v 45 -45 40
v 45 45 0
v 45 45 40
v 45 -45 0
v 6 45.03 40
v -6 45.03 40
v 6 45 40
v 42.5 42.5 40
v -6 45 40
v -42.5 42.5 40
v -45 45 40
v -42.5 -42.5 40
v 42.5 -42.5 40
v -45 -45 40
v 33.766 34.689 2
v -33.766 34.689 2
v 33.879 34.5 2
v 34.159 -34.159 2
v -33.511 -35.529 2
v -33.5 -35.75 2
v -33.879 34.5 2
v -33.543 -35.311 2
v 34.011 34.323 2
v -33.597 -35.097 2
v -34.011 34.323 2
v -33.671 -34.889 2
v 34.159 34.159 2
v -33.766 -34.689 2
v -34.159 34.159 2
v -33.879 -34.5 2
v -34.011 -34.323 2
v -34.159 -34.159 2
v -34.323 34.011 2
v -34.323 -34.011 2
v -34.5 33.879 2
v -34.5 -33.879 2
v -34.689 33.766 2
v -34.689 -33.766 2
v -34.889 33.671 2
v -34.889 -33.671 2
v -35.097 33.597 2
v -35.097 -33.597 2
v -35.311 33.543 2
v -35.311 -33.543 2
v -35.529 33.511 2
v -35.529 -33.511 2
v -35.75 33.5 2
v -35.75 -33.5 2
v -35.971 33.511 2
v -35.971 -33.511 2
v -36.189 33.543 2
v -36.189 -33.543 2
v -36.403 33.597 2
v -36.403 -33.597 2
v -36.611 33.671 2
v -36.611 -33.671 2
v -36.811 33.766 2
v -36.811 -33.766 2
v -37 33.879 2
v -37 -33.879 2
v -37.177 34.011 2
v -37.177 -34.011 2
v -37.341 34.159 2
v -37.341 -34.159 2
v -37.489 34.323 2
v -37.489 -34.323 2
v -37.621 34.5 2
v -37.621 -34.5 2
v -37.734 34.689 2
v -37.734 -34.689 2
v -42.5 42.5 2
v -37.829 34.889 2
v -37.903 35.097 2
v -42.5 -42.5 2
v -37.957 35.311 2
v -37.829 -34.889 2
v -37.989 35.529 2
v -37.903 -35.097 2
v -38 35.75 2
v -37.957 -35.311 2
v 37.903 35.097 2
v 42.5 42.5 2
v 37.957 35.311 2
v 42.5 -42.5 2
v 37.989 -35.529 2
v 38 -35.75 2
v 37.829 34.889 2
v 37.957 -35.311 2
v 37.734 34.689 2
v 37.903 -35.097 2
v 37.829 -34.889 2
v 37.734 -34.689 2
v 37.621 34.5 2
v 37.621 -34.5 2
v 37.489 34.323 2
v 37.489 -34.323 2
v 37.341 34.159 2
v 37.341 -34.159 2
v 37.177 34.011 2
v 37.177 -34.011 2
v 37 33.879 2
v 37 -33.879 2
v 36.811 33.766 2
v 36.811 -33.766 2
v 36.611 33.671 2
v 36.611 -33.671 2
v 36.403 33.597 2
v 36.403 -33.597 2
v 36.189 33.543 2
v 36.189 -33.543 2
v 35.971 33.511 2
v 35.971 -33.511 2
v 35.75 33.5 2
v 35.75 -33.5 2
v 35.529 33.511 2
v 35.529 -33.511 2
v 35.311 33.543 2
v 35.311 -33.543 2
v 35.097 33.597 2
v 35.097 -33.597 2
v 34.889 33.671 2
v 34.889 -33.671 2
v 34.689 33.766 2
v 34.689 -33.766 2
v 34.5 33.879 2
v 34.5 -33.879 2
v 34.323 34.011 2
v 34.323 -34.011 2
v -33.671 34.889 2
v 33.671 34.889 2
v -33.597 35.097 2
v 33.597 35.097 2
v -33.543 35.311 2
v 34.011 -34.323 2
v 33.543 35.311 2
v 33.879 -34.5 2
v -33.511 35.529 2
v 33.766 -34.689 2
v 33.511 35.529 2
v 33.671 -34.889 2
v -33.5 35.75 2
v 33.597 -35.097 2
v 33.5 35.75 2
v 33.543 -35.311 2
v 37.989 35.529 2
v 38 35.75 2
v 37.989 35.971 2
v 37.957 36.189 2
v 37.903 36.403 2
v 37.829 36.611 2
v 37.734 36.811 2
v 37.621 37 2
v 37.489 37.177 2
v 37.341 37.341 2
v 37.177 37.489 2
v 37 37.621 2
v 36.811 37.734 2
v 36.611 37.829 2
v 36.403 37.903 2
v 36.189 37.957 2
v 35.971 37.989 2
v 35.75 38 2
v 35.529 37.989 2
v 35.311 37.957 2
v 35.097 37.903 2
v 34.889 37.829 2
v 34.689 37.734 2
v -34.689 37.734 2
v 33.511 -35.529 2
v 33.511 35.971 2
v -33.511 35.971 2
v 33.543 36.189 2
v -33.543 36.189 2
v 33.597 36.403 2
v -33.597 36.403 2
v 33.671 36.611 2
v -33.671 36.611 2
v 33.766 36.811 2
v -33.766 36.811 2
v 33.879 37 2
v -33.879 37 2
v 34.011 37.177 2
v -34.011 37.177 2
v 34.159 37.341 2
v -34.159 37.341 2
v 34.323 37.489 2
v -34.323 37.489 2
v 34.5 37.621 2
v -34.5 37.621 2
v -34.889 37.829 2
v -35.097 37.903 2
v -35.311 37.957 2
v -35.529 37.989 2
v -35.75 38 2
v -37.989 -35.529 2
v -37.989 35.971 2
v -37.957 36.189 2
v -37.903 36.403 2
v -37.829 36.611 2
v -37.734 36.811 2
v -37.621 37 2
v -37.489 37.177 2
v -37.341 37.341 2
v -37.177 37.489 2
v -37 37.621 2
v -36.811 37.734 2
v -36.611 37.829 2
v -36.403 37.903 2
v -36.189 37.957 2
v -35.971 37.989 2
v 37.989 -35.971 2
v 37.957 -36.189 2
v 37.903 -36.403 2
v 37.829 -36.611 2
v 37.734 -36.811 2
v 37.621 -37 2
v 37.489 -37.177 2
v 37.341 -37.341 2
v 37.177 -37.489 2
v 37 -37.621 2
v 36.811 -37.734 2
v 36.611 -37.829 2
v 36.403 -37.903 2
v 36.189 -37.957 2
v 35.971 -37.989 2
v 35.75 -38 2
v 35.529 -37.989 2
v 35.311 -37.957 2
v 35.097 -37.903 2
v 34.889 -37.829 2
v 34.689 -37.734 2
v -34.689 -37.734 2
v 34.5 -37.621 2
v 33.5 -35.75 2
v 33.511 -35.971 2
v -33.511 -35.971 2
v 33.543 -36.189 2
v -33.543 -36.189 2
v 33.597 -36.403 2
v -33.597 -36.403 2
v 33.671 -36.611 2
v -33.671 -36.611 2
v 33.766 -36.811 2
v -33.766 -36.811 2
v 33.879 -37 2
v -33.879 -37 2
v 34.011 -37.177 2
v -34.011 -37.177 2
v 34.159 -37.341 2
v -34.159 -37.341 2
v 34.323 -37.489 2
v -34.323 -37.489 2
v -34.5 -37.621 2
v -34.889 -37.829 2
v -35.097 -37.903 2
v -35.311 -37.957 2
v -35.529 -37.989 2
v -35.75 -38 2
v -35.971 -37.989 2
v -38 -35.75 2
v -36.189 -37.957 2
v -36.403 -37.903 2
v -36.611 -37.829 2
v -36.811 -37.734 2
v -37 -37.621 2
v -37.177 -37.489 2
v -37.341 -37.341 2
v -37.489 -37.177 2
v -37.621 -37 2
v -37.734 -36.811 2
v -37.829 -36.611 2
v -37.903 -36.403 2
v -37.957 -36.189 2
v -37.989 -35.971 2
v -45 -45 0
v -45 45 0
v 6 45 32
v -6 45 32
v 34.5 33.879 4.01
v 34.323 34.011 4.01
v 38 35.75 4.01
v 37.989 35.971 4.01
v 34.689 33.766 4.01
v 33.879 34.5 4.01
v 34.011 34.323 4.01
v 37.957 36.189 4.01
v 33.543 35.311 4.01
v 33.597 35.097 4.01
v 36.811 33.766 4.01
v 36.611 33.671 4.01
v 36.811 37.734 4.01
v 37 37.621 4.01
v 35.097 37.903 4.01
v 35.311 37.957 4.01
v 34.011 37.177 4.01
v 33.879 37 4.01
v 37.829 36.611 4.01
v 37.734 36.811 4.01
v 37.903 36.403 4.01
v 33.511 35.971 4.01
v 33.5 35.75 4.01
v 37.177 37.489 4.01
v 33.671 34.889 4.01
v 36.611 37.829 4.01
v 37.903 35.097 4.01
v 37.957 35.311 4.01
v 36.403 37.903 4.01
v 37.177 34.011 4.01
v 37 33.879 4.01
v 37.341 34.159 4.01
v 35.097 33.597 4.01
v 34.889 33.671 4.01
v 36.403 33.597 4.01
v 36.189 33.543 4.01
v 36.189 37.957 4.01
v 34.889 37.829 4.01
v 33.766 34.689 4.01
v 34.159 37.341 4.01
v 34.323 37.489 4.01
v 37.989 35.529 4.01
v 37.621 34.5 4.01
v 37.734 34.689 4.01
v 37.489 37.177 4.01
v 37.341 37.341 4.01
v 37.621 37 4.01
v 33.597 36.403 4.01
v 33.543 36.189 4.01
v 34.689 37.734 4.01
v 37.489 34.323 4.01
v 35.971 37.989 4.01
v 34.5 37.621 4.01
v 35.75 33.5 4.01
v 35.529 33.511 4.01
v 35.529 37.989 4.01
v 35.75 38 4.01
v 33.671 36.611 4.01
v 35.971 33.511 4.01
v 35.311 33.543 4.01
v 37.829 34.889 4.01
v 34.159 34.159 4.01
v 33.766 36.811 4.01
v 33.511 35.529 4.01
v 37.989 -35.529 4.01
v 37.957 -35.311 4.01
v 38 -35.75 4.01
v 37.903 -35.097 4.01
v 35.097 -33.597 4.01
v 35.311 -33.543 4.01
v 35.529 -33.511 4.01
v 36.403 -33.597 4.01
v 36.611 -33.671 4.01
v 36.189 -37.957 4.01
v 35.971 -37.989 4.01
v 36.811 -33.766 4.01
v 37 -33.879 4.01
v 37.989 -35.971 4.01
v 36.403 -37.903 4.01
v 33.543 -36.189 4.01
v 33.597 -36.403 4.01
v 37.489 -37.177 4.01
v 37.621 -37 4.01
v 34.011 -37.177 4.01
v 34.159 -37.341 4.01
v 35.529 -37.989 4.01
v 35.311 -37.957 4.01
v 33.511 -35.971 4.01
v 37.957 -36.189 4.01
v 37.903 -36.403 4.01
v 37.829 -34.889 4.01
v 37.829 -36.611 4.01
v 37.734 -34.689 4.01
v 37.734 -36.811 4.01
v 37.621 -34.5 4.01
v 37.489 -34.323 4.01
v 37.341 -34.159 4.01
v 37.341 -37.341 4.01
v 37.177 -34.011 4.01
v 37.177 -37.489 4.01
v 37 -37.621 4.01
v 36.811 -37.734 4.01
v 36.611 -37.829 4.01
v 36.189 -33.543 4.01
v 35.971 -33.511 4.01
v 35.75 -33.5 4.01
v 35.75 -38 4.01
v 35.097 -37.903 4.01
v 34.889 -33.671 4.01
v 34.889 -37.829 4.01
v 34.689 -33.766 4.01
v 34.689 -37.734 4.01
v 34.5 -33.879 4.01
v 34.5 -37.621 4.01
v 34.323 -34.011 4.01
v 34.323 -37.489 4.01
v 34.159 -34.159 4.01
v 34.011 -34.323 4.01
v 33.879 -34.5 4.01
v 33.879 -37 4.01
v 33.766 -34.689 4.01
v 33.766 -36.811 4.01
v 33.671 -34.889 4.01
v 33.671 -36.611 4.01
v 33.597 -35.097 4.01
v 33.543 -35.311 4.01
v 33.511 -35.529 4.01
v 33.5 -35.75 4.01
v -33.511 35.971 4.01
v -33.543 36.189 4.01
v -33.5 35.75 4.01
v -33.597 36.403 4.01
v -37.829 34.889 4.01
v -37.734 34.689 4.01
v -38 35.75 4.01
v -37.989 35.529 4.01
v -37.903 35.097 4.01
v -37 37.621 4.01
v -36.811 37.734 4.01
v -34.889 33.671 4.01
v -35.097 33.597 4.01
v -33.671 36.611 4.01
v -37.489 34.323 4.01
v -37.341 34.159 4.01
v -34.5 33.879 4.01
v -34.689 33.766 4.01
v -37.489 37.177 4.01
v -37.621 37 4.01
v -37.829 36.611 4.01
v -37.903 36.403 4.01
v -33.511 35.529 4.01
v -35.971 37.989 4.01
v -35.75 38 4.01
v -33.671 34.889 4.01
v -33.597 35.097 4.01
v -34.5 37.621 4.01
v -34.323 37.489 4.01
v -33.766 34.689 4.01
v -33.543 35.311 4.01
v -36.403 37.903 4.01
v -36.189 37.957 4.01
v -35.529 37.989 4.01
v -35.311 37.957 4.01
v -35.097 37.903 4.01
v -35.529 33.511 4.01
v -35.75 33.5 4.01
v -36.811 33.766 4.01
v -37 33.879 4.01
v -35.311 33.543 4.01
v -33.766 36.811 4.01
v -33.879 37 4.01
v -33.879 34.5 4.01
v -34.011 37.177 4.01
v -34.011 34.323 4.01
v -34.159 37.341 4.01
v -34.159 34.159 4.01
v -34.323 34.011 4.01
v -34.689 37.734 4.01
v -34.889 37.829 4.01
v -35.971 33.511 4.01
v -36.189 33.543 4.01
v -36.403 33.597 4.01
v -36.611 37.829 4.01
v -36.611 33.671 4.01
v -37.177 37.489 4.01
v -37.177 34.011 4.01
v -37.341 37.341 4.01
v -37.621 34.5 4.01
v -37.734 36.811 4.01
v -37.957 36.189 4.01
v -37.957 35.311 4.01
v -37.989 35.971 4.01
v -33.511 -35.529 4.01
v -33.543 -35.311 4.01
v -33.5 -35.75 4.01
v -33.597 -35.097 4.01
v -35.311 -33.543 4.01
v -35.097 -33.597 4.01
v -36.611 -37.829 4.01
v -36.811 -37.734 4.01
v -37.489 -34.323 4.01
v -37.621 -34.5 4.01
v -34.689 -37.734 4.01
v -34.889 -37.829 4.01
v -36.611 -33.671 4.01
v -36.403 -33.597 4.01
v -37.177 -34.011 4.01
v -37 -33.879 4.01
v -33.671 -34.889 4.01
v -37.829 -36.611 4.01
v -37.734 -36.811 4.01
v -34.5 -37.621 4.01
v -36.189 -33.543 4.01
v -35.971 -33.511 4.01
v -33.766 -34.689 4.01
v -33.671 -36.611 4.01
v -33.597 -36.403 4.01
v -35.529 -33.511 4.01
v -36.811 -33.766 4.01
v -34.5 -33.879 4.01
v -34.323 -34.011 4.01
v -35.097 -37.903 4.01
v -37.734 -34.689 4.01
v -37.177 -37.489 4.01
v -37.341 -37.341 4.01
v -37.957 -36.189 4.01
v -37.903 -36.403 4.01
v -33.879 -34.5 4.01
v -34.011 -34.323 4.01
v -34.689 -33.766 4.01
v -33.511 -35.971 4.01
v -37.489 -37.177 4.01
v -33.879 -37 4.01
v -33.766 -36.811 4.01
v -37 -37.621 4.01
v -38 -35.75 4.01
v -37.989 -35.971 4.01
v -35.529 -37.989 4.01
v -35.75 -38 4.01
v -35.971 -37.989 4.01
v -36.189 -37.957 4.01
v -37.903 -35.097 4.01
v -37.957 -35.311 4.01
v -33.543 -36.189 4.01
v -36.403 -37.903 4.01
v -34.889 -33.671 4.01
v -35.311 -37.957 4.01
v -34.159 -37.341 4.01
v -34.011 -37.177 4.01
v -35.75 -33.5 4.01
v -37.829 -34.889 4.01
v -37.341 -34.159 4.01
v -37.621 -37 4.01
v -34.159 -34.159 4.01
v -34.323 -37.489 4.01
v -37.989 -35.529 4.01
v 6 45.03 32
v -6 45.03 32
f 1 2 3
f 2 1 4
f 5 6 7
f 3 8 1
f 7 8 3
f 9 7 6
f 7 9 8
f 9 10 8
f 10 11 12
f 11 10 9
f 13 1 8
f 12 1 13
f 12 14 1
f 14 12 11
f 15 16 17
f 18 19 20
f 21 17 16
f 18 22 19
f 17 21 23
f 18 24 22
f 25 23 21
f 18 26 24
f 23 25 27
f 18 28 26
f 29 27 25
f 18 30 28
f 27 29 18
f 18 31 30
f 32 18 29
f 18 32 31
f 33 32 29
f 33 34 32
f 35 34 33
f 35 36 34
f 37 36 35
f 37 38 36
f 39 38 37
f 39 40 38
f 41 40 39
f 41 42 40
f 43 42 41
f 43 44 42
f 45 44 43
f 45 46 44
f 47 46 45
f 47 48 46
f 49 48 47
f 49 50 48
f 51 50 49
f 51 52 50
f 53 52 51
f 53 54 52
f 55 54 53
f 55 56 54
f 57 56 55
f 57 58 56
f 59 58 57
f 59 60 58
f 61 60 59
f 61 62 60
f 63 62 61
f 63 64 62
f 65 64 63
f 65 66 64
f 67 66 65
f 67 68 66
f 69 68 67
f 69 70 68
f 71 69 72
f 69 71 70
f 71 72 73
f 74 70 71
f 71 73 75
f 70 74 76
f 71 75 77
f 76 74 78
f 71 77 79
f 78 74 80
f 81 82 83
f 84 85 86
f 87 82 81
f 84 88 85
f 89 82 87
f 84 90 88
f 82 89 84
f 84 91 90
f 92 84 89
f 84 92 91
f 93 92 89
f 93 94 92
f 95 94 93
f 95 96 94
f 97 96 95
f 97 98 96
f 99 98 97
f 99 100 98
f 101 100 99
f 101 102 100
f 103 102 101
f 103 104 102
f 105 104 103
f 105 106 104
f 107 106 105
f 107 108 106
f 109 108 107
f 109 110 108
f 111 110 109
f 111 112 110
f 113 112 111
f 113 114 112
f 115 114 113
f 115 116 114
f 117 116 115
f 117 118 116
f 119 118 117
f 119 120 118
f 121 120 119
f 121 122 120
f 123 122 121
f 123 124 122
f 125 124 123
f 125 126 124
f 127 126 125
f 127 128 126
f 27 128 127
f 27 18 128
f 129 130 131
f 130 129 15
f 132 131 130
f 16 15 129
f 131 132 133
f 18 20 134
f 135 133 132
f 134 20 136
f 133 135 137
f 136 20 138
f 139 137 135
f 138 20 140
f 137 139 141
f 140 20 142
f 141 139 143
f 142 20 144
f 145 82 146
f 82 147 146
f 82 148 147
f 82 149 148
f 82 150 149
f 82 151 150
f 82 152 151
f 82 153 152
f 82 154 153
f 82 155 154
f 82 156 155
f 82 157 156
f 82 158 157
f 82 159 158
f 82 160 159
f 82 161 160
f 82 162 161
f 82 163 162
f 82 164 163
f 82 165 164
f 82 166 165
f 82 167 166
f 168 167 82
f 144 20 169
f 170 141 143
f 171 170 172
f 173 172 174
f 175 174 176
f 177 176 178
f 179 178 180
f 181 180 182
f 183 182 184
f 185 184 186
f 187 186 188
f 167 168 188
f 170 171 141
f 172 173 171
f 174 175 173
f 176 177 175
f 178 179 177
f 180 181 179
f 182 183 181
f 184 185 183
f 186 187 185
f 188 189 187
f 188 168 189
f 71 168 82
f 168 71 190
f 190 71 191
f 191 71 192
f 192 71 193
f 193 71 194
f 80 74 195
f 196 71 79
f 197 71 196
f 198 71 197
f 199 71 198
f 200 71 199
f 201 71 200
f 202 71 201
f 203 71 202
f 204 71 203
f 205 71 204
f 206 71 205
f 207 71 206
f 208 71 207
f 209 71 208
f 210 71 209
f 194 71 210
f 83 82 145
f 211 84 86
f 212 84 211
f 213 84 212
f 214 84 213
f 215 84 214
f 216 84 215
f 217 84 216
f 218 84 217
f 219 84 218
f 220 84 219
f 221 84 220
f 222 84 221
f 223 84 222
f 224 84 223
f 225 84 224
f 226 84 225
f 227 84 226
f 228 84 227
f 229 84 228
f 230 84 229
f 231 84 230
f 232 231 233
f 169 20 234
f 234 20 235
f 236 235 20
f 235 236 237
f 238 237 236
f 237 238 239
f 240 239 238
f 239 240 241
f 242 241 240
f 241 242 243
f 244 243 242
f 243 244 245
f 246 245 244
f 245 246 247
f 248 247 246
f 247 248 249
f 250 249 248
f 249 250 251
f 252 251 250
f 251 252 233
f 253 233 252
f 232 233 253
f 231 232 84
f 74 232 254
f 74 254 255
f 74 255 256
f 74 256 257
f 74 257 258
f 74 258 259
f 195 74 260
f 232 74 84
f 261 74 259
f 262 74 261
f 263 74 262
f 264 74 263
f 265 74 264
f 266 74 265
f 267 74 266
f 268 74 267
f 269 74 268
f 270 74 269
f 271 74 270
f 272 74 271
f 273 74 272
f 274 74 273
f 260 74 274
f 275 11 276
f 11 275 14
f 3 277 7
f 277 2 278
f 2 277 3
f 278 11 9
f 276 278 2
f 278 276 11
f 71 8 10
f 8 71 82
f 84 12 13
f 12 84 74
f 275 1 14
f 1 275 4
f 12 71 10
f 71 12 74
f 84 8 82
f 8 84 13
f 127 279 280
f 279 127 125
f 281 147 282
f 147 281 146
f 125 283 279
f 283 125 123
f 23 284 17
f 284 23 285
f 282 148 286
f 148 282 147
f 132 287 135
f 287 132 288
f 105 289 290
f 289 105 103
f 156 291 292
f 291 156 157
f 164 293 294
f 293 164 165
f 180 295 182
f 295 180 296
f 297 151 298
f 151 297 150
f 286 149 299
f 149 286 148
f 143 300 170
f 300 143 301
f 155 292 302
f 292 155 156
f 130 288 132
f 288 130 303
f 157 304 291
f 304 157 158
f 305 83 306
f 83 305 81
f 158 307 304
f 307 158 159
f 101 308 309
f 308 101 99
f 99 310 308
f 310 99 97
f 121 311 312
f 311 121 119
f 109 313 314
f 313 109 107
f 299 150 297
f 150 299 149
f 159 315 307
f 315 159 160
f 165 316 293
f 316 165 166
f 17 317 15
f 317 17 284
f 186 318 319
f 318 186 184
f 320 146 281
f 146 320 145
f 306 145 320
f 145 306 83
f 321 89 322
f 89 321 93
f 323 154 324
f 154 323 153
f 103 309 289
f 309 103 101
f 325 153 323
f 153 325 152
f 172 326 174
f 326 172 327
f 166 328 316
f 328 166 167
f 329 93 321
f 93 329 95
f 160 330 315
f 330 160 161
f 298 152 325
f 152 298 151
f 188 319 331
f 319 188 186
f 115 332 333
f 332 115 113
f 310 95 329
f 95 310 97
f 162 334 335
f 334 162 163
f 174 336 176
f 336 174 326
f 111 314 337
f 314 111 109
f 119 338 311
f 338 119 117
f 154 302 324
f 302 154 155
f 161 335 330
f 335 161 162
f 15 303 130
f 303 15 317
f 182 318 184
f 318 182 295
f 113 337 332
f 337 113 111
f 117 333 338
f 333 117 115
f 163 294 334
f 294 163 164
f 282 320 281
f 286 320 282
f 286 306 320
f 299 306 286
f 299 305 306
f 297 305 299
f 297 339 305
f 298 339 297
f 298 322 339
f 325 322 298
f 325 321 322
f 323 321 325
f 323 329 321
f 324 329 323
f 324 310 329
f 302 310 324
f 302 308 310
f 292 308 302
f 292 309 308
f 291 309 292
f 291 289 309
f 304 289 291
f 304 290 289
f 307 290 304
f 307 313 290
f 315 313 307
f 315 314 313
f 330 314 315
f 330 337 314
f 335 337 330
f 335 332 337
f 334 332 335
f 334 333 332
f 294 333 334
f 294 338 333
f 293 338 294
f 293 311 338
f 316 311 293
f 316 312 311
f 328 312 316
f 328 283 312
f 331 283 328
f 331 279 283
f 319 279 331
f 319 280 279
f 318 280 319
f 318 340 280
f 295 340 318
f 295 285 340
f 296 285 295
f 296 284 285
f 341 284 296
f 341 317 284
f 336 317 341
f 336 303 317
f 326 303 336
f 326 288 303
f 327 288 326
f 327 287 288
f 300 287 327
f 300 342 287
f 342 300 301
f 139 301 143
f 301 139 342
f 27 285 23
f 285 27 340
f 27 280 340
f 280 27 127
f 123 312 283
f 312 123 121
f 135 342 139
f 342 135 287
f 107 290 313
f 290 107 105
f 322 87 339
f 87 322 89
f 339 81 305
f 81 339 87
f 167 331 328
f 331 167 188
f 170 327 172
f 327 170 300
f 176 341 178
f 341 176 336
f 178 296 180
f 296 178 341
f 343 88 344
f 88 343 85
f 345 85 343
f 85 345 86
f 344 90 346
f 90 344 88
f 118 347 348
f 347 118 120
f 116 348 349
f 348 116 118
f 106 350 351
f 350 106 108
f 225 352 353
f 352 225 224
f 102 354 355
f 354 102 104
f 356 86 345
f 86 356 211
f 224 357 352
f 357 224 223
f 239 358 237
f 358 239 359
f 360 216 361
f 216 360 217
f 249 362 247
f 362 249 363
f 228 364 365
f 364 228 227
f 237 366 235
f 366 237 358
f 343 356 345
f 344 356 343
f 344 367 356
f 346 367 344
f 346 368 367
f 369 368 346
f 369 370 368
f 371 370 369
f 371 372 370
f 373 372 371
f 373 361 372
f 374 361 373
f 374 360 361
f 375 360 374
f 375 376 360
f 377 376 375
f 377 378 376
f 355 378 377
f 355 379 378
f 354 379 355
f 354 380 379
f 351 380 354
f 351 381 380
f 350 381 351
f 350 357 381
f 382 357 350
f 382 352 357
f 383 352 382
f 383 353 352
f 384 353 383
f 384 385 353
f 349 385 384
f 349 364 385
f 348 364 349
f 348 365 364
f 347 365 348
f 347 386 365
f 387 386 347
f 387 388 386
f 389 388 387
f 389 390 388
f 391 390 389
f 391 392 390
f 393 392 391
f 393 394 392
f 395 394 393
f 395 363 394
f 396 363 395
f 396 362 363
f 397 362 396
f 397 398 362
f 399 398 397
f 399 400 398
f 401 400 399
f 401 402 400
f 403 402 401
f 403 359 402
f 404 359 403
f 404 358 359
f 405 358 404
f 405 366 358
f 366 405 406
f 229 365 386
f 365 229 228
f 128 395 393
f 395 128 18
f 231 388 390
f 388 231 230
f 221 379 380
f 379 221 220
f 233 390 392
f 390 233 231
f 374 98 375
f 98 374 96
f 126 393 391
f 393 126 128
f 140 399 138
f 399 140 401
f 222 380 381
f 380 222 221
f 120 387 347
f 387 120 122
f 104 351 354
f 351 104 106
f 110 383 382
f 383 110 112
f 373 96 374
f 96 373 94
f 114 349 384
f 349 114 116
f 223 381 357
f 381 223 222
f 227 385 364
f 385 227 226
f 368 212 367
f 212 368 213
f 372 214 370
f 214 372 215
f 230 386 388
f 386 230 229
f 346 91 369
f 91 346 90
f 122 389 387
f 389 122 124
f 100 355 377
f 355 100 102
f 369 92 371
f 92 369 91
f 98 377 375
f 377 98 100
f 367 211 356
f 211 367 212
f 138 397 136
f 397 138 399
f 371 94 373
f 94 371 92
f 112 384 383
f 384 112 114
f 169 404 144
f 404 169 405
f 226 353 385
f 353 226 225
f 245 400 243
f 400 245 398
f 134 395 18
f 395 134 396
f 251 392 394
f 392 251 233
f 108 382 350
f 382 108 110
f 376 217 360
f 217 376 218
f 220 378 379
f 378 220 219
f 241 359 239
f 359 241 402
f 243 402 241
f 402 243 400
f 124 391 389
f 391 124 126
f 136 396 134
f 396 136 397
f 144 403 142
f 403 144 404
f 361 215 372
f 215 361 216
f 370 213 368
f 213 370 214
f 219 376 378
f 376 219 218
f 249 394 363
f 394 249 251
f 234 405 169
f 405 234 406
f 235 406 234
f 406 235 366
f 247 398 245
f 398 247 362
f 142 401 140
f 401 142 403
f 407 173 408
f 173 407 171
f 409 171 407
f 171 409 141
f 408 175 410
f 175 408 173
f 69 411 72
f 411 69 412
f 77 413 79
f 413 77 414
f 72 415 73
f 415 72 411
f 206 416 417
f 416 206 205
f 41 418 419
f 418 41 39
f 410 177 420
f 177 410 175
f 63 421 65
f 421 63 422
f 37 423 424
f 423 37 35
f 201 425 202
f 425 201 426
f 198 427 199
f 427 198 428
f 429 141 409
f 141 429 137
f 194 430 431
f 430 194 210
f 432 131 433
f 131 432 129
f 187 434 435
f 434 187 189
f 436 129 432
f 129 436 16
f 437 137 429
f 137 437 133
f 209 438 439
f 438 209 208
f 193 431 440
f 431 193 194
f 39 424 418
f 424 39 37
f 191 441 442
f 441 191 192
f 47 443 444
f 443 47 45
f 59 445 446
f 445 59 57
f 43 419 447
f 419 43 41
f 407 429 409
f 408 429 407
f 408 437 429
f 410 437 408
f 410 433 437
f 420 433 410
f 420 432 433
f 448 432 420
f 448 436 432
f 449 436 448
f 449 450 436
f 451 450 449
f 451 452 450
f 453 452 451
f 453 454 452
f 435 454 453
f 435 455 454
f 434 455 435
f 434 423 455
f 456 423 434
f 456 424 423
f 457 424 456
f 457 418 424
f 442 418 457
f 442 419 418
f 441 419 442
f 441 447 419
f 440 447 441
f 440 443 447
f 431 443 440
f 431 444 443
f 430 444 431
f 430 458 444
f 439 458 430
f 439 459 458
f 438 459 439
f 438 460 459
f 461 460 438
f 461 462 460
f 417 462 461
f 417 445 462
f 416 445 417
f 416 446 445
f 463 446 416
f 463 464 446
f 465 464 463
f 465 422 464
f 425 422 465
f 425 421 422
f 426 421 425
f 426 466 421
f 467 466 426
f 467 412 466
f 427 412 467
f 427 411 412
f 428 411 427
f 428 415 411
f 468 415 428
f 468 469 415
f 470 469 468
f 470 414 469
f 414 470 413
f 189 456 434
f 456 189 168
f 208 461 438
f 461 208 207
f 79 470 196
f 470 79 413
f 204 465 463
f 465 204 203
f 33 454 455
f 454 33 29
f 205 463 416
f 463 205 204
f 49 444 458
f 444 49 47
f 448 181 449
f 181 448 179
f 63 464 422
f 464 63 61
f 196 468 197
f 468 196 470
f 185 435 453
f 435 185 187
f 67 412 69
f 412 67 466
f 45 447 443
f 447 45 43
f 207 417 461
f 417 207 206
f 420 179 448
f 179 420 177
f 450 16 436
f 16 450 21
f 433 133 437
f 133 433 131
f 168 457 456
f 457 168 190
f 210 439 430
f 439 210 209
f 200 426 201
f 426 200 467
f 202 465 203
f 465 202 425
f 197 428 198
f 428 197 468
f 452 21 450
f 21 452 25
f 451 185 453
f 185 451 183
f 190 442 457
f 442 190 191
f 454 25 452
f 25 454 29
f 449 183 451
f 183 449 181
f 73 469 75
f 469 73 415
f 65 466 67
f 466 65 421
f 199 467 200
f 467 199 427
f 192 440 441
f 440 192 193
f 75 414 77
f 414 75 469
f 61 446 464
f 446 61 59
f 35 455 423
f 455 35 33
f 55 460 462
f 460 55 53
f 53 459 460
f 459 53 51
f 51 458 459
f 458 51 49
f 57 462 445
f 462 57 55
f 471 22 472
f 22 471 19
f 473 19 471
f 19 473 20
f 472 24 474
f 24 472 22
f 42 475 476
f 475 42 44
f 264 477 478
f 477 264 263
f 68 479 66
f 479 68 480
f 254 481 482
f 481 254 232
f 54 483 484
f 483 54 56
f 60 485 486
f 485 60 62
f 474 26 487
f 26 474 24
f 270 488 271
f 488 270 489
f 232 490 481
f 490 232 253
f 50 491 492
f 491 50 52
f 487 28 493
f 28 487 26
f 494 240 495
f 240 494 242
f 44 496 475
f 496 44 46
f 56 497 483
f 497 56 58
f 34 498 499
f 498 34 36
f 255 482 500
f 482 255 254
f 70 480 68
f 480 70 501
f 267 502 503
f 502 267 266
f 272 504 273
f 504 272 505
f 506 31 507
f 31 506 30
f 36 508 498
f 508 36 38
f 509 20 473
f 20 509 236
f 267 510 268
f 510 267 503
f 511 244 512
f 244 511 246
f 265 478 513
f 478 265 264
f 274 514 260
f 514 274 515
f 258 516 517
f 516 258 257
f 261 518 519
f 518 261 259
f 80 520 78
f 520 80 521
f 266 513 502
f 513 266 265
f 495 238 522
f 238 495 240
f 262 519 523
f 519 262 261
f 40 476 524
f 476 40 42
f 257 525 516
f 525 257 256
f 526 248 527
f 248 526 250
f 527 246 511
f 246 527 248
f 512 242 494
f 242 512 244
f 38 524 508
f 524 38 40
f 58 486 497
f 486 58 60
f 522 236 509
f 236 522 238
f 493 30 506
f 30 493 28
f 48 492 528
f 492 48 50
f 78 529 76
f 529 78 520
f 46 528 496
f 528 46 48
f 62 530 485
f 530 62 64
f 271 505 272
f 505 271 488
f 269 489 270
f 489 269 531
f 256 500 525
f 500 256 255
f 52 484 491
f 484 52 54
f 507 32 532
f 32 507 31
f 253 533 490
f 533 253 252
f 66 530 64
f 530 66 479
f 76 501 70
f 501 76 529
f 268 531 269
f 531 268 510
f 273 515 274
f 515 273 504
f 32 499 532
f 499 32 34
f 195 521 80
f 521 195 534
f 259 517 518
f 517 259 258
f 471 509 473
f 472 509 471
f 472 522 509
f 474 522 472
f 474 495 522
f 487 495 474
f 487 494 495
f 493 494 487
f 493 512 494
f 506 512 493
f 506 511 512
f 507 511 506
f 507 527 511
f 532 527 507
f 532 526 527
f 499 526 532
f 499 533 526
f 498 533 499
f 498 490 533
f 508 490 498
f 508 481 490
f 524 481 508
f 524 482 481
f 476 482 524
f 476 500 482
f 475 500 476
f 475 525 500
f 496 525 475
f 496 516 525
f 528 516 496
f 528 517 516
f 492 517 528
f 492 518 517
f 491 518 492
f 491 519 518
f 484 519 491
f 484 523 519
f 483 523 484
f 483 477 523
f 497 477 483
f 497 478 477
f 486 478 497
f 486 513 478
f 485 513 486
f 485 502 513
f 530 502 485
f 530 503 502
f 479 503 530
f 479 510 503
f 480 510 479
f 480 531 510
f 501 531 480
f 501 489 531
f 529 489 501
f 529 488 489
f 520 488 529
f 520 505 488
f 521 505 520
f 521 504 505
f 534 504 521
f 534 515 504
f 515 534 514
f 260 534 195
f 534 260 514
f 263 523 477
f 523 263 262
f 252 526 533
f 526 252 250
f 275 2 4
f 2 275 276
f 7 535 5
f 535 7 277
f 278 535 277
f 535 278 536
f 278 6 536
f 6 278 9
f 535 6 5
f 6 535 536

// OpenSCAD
// DIY Magnetic Stirrer Housing
// Dimensions in mm

// Parameters
outer_size = 90;           // Outer X/Y size of the housing
wall_thickness = 2.5;      // Wall thickness
top_thickness = 2;         // Top plate thickness
height = 40;               // Total height (from top plate to open top)
hole_pattern = 71.5;       // Screw hole pattern square size
hole_diameter = 4.5;       // Screw hole diameter
notch_width = 12;          // Power cable notch width
notch_depth = 8;           // Notch depth from top (40 - 32 = 8)
notch_height_start = 32;   // Notch starts at z = 32

// Set resolution for curves
$fn = 64;

// Calculate inner dimensions
inner_size = outer_size - 2 * wall_thickness;

// Base plate (top plate in use, printed flat at z=0)
module base_plate() {
    translate([-(outer_size/2), -(outer_size/2), 0]) {
        cube([outer_size, outer_size, top_thickness]);
    }
}

// Walls
module walls() {
    // Front wall (Y+ side)
    translate([-(outer_size/2), (outer_size/2) - wall_thickness, top_thickness]) {
        cube([outer_size, wall_thickness, height - top_thickness]);
    }
    
    // Back wall (Y- side)
    translate([-(outer_size/2), -(outer_size/2), top_thickness]) {
        cube([outer_size, wall_thickness, height - top_thickness]);
    }
    
    // Left wall (X- side)
    translate([-(outer_size/2), -(outer_size/2), top_thickness]) {
        cube([wall_thickness, outer_size, height - top_thickness]);
    }
    
    // Right wall (X+ side)
    translate([(outer_size/2) - wall_thickness, -(outer_size/2), top_thickness]) {
        cube([wall_thickness, outer_size, height - top_thickness]);
    }
}

// Screw holes (4.5mm for M4 screws)
module screw_holes() {
    half_pattern = hole_pattern / 2;
    hole_radius = hole_diameter / 2;
    
    // Positions of the four holes relative to center
    positions = [
        [half_pattern, half_pattern],
        [half_pattern, -half_pattern],
        [-half_pattern, half_pattern],
        [-half_pattern, -half_pattern]
    ];
    
    for (i = [0:3]) {
        translate([positions[i][0], positions[i][1], -0.01]) {
            cylinder(h = top_thickness + 0.02, r = hole_radius);
        }
    }
}

// Power cable notch
module notch() {
    // Notch in the front wall (Y+ side)
    // Centered along the wall (X direction), 12mm wide
    // Extends from z = 32 to z = 40 (height - notch_depth to height)
    translate([-(notch_width/2), (outer_size/2) - wall_thickness + 0.01, notch_height_start]) {
        cube([notch_width, wall_thickness + 0.02, height - notch_height_start]);
    }
}

// Assemble the housing
module housing() {
    union() {
        // Base plate
        base_plate();
        
        // Walls
        walls();
        
        // Subtract screw holes
        translate([0, 0, top_thickness]) {
            rotate([0, 0, 0]) {
                screw_holes();
            }
        }
        
        // Subtract notch
        notch();
    }
}

// Build the housing
housing();
